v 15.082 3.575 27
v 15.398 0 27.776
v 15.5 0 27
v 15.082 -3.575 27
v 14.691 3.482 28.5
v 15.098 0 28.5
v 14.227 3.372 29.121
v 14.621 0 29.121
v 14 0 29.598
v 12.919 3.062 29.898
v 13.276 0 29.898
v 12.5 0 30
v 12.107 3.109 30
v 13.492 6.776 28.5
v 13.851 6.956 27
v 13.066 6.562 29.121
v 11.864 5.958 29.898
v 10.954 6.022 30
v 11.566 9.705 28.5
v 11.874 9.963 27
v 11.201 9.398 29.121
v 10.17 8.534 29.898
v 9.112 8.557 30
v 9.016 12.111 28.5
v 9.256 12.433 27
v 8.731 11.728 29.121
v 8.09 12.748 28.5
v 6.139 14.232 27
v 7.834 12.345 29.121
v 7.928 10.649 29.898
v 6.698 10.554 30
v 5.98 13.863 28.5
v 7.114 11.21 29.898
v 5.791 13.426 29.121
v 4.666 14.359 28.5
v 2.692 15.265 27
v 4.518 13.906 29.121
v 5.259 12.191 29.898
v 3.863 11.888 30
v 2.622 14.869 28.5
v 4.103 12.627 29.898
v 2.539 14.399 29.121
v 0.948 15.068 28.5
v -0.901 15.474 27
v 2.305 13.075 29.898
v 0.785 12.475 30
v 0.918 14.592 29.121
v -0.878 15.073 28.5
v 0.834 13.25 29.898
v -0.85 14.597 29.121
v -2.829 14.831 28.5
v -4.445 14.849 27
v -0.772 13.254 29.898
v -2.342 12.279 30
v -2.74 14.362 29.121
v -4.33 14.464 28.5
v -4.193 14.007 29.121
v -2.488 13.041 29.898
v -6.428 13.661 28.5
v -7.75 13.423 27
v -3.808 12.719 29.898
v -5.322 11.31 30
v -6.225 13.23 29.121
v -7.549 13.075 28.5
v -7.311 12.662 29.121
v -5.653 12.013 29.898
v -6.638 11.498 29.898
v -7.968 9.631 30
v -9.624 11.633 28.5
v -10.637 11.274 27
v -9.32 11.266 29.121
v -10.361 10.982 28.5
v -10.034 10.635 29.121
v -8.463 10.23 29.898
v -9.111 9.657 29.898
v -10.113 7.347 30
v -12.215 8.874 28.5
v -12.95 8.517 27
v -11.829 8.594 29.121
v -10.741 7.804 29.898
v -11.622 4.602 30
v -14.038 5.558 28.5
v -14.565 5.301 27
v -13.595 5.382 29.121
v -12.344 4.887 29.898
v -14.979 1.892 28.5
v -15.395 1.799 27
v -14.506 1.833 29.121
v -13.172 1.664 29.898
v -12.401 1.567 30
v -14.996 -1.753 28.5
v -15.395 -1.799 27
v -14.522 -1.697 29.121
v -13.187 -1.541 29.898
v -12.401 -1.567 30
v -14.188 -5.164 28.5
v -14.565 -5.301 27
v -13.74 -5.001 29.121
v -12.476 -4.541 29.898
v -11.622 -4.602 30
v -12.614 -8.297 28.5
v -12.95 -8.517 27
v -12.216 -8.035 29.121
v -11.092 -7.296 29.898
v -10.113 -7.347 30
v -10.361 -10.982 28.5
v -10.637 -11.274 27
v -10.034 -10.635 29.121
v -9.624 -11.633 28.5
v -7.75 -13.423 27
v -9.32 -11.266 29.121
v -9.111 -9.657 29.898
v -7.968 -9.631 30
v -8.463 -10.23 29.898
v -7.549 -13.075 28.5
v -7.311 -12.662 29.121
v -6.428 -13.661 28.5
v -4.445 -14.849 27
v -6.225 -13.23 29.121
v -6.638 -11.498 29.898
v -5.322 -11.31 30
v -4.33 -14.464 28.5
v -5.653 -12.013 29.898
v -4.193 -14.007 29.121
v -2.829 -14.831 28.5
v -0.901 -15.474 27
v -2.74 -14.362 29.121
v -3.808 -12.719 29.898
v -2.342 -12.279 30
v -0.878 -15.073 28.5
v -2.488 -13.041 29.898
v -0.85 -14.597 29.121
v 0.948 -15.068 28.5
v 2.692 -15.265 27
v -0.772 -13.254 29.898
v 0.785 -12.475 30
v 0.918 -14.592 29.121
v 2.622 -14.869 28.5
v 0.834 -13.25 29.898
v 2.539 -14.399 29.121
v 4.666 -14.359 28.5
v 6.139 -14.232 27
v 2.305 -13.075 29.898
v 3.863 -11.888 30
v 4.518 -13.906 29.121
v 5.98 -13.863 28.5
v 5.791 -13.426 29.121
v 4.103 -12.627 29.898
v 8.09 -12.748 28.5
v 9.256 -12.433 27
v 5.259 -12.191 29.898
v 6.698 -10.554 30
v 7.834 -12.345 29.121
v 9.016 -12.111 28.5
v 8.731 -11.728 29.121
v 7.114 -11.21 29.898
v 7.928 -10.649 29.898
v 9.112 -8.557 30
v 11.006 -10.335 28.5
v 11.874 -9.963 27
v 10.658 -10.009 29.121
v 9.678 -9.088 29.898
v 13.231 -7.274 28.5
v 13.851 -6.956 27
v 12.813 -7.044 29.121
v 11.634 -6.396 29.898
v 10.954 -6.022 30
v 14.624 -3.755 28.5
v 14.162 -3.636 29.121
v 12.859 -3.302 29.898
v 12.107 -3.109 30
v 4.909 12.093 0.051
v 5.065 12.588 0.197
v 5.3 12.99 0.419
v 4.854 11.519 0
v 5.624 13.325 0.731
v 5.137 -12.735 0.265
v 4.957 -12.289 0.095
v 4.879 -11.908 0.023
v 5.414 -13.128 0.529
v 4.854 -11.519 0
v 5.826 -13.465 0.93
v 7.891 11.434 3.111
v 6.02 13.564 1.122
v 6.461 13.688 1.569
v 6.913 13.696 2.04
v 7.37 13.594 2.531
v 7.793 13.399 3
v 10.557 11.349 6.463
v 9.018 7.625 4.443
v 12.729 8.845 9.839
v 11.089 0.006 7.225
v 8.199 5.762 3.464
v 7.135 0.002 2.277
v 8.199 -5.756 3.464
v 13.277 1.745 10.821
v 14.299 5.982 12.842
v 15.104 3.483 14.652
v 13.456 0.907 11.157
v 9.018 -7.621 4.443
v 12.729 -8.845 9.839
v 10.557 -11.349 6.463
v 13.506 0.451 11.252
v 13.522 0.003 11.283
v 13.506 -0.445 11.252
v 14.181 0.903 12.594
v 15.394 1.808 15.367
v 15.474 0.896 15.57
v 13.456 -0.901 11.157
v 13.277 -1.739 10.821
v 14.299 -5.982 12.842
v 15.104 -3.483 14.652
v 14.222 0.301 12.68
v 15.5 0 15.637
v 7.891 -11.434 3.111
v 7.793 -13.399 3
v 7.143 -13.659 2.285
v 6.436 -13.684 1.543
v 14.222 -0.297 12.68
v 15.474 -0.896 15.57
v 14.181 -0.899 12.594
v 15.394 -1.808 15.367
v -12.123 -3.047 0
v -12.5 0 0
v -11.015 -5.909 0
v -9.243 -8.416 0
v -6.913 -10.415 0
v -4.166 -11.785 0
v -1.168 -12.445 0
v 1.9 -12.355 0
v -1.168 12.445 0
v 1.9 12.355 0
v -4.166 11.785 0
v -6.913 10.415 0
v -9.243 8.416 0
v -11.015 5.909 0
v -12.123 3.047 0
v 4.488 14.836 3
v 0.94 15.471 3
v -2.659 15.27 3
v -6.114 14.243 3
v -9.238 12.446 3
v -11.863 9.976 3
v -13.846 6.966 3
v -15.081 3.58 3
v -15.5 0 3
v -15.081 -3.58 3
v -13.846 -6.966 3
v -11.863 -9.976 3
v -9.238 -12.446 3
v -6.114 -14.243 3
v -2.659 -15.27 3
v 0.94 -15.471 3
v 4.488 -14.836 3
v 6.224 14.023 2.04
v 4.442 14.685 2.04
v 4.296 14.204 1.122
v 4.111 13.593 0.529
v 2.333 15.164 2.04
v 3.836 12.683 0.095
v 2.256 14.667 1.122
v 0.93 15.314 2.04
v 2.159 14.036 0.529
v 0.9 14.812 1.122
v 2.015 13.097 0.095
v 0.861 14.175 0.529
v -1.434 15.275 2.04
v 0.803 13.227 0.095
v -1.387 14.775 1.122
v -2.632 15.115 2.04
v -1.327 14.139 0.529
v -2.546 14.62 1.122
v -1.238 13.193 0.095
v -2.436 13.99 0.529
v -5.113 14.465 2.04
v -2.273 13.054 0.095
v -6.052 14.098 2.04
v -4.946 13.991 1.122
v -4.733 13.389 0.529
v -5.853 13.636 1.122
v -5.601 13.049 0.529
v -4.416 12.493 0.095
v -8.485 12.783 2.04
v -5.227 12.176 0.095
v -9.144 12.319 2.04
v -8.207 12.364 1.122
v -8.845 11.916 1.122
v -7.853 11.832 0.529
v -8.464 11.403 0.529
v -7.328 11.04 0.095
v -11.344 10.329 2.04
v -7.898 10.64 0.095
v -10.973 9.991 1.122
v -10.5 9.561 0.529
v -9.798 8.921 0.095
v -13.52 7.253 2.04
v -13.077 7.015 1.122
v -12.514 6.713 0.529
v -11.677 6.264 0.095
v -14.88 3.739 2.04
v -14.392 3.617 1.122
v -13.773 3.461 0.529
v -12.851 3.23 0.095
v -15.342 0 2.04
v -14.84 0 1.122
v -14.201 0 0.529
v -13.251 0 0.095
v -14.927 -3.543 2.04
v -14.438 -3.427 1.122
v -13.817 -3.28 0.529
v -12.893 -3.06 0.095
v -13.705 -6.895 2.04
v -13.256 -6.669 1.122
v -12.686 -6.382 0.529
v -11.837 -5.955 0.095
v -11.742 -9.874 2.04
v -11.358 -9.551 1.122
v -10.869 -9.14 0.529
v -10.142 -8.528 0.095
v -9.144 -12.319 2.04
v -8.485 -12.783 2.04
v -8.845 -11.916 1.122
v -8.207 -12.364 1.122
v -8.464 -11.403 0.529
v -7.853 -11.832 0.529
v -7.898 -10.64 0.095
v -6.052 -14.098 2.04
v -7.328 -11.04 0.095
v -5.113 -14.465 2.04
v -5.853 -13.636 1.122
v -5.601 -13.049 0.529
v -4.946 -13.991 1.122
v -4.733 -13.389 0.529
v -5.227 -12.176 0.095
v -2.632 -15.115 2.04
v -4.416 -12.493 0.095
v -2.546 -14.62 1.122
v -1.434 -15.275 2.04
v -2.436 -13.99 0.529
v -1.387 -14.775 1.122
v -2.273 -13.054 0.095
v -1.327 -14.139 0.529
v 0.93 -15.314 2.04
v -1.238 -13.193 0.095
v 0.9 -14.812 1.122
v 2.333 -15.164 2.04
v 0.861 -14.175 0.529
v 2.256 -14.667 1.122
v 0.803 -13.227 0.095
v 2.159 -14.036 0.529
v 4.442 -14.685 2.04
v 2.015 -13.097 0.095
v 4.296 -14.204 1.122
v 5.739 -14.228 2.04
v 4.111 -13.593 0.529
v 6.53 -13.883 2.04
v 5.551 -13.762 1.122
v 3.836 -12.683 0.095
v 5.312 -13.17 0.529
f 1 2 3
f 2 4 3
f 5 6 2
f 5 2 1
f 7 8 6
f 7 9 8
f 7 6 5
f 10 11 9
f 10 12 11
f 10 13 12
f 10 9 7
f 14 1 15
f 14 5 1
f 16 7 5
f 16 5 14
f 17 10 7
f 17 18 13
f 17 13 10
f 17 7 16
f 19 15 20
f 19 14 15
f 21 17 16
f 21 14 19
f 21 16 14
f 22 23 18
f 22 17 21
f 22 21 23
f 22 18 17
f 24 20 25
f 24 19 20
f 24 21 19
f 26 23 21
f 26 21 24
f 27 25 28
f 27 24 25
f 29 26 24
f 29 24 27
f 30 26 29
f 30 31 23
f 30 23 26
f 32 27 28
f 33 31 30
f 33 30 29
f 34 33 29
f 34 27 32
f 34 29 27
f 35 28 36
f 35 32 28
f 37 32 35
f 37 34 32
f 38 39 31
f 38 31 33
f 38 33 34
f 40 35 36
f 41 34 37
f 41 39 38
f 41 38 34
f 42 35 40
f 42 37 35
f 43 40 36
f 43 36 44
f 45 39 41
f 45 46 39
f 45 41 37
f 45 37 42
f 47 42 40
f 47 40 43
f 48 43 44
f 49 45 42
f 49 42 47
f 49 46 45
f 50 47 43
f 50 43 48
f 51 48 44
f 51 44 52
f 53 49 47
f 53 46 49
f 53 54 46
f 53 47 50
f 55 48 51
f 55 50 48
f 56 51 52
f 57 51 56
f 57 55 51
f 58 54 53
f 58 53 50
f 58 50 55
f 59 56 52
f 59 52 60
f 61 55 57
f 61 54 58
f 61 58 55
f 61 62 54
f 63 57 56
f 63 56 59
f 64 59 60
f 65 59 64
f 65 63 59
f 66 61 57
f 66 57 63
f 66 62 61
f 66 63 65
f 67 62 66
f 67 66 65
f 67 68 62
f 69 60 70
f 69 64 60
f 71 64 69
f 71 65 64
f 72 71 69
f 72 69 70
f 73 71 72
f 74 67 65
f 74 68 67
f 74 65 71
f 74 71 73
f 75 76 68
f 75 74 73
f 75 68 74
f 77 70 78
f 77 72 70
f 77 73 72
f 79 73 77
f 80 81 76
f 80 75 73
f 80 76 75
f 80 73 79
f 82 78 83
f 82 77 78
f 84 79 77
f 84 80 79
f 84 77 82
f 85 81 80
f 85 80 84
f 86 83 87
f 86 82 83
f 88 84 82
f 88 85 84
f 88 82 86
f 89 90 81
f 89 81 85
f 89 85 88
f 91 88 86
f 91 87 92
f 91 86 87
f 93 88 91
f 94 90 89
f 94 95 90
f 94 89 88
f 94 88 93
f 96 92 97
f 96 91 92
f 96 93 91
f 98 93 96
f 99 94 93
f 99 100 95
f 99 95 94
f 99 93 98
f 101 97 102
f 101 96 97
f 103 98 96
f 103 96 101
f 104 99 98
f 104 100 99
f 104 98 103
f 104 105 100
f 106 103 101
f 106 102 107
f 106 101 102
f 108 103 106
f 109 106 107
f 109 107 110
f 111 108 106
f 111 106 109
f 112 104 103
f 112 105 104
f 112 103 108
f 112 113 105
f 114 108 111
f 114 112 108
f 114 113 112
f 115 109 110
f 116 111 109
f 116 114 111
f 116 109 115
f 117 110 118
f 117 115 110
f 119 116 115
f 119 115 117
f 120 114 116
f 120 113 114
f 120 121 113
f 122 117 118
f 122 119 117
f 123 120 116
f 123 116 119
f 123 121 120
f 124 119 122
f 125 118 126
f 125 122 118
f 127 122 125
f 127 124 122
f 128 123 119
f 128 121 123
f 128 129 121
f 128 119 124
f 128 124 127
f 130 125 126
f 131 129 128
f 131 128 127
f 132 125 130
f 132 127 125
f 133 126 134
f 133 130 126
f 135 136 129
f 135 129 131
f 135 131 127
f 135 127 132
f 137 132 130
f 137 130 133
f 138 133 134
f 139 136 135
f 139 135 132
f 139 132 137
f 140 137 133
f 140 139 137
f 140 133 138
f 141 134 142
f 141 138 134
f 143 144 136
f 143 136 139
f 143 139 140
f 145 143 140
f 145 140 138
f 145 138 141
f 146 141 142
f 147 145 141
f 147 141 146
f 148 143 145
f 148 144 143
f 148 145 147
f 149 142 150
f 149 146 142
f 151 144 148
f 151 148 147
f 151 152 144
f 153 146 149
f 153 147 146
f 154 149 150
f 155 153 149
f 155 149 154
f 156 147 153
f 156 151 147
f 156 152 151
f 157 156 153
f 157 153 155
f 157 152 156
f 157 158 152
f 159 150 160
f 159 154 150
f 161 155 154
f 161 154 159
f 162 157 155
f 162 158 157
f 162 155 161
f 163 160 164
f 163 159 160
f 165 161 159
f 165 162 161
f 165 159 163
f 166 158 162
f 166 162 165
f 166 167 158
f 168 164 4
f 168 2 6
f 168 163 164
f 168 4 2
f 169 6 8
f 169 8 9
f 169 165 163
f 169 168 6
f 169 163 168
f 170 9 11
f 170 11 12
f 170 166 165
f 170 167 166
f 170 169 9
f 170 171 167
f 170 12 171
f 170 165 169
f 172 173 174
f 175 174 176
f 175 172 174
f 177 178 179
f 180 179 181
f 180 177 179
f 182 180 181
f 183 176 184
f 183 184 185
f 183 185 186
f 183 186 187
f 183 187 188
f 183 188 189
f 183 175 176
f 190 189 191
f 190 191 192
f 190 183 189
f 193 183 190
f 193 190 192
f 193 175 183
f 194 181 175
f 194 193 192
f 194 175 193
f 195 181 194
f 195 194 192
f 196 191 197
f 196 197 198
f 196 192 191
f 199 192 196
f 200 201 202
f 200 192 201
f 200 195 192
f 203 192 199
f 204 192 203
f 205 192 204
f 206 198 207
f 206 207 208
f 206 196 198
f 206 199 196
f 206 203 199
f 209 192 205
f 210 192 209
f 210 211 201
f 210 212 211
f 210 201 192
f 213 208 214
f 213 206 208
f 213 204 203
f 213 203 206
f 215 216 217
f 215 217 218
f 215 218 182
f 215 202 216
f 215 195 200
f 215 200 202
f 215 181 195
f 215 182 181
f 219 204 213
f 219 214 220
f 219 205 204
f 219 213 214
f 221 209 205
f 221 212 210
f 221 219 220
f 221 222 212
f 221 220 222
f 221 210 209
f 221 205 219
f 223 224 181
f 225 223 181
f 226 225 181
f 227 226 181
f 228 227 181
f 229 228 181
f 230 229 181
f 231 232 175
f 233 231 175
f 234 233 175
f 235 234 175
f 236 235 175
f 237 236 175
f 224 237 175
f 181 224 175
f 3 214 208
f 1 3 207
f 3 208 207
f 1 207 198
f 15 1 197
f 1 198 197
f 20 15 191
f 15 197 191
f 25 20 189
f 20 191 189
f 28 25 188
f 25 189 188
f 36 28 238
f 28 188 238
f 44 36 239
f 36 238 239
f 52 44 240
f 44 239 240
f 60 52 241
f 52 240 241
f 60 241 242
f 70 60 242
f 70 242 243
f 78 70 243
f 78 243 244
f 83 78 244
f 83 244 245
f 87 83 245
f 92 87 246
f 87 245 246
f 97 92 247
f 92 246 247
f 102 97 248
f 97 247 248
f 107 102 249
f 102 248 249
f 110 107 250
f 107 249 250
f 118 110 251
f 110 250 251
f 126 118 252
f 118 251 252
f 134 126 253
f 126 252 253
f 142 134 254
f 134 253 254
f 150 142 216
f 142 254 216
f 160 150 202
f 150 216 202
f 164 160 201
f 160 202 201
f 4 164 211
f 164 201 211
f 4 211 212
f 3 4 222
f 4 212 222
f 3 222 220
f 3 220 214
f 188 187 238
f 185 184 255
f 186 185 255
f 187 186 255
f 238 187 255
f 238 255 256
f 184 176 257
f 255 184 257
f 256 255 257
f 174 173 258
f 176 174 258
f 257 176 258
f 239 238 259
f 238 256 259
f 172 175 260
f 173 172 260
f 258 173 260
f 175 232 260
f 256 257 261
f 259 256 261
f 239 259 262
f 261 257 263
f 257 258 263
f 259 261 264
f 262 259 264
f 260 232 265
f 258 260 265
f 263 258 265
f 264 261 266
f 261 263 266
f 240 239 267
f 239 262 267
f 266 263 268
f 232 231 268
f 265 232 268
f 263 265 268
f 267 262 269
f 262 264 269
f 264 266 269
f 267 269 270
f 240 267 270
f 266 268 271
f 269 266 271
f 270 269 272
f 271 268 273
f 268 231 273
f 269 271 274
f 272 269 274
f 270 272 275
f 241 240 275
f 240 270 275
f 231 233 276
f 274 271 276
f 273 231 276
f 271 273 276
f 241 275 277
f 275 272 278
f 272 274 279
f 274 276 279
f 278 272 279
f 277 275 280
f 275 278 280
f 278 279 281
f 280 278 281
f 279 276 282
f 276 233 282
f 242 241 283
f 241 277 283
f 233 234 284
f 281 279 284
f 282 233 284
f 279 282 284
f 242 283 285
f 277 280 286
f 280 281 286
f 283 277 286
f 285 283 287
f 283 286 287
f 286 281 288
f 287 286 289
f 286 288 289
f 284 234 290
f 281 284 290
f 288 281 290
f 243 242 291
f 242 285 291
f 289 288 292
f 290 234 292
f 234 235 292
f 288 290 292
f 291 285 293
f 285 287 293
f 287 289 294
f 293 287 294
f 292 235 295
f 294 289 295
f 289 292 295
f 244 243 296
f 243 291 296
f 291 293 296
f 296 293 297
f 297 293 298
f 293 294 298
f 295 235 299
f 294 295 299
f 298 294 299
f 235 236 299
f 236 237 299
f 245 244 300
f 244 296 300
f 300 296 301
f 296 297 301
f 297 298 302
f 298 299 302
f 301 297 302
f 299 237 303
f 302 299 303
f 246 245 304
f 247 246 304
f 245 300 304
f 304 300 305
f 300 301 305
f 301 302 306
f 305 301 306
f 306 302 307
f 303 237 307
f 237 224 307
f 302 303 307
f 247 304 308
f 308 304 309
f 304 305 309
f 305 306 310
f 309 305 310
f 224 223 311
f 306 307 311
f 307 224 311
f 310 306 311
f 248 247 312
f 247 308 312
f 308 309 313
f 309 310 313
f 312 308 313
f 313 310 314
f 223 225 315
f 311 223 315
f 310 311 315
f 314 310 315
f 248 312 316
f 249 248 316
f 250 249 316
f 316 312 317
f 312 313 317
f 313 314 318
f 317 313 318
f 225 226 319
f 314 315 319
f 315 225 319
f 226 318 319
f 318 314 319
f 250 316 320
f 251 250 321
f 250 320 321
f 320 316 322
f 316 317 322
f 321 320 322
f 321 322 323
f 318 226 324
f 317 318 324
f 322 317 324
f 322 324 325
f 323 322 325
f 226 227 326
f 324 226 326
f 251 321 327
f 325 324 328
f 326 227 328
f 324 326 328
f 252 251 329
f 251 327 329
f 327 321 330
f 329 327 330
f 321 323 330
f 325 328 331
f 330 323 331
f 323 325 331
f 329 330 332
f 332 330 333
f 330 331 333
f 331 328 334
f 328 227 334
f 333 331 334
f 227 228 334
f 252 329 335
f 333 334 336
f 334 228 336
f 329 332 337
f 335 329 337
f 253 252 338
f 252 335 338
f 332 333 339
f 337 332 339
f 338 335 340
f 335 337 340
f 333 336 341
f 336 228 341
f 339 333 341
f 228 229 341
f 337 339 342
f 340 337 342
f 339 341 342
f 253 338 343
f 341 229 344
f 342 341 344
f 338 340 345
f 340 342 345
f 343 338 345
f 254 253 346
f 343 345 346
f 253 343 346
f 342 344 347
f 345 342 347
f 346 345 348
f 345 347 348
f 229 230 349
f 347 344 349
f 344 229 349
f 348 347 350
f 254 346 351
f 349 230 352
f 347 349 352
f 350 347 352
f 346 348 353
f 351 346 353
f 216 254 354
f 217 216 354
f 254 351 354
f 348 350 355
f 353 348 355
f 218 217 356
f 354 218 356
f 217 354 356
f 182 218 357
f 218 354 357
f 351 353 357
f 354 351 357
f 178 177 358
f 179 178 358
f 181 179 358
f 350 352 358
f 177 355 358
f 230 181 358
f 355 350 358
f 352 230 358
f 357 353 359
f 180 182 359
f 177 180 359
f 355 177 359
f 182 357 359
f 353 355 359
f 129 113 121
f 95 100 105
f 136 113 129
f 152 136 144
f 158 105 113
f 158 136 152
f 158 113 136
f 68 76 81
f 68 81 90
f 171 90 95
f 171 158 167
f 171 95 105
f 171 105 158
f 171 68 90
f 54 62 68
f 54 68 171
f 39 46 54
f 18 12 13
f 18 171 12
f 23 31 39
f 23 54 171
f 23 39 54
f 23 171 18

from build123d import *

# Parameters (mm, degrees)
SKETCH2_R               = 15.5
BOSS_EXTRUDE1_DEPTH     = 30
FILLET1_R               = 3
CUT_EXTRUDE1_DEPTH      = 20
CUT_EXTRUDE1_DEPTH_BACK = 20


with BuildPart() as part:
    # Sketch2 → Boss-Extrude1 (new body)
    with BuildSketch(Plane.XY):
        Circle(SKETCH2_R)
    extrude(amount=BOSS_EXTRUDE1_DEPTH)

    # Fillet1
    fillet1_edges = [part.edges().sort_by_distance(p)[0] for p in [
        (-15.5, 0, 0),
        (-15.5, 0, 30),
    ]]
    fillet(fillet1_edges, radius=FILLET1_R)

    # Sketch3 → Cut-Extrude1 (cut, two sides: drawn at the far end of the back side and taken through both)
    with BuildSketch(Plane(origin=(0, 0, 0), x_dir=(1, 0, 0), z_dir=(0, 1, 0)).offset(-CUT_EXTRUDE1_DEPTH_BACK)):
        with BuildLine():
            Line((4.854198749, 0), (19.206398093, 0))
            Line((19.206398093, 0), (19.206398093, -15.636699312))
            Line((19.206398093, -15.636699312), (15.5, -15.636699312))
            add(Edge.make_bspline(
                [(4.854198749, 0), (12.000659595, -6.632087606), (15.5, -15.636699312)],
                knots=[0, 0, 0, 1, 1, 1], degree=2))
        make_face()
    extrude(amount=CUT_EXTRUDE1_DEPTH + CUT_EXTRUDE1_DEPTH_BACK, mode=Mode.SUBTRACT)


solid = part.part
